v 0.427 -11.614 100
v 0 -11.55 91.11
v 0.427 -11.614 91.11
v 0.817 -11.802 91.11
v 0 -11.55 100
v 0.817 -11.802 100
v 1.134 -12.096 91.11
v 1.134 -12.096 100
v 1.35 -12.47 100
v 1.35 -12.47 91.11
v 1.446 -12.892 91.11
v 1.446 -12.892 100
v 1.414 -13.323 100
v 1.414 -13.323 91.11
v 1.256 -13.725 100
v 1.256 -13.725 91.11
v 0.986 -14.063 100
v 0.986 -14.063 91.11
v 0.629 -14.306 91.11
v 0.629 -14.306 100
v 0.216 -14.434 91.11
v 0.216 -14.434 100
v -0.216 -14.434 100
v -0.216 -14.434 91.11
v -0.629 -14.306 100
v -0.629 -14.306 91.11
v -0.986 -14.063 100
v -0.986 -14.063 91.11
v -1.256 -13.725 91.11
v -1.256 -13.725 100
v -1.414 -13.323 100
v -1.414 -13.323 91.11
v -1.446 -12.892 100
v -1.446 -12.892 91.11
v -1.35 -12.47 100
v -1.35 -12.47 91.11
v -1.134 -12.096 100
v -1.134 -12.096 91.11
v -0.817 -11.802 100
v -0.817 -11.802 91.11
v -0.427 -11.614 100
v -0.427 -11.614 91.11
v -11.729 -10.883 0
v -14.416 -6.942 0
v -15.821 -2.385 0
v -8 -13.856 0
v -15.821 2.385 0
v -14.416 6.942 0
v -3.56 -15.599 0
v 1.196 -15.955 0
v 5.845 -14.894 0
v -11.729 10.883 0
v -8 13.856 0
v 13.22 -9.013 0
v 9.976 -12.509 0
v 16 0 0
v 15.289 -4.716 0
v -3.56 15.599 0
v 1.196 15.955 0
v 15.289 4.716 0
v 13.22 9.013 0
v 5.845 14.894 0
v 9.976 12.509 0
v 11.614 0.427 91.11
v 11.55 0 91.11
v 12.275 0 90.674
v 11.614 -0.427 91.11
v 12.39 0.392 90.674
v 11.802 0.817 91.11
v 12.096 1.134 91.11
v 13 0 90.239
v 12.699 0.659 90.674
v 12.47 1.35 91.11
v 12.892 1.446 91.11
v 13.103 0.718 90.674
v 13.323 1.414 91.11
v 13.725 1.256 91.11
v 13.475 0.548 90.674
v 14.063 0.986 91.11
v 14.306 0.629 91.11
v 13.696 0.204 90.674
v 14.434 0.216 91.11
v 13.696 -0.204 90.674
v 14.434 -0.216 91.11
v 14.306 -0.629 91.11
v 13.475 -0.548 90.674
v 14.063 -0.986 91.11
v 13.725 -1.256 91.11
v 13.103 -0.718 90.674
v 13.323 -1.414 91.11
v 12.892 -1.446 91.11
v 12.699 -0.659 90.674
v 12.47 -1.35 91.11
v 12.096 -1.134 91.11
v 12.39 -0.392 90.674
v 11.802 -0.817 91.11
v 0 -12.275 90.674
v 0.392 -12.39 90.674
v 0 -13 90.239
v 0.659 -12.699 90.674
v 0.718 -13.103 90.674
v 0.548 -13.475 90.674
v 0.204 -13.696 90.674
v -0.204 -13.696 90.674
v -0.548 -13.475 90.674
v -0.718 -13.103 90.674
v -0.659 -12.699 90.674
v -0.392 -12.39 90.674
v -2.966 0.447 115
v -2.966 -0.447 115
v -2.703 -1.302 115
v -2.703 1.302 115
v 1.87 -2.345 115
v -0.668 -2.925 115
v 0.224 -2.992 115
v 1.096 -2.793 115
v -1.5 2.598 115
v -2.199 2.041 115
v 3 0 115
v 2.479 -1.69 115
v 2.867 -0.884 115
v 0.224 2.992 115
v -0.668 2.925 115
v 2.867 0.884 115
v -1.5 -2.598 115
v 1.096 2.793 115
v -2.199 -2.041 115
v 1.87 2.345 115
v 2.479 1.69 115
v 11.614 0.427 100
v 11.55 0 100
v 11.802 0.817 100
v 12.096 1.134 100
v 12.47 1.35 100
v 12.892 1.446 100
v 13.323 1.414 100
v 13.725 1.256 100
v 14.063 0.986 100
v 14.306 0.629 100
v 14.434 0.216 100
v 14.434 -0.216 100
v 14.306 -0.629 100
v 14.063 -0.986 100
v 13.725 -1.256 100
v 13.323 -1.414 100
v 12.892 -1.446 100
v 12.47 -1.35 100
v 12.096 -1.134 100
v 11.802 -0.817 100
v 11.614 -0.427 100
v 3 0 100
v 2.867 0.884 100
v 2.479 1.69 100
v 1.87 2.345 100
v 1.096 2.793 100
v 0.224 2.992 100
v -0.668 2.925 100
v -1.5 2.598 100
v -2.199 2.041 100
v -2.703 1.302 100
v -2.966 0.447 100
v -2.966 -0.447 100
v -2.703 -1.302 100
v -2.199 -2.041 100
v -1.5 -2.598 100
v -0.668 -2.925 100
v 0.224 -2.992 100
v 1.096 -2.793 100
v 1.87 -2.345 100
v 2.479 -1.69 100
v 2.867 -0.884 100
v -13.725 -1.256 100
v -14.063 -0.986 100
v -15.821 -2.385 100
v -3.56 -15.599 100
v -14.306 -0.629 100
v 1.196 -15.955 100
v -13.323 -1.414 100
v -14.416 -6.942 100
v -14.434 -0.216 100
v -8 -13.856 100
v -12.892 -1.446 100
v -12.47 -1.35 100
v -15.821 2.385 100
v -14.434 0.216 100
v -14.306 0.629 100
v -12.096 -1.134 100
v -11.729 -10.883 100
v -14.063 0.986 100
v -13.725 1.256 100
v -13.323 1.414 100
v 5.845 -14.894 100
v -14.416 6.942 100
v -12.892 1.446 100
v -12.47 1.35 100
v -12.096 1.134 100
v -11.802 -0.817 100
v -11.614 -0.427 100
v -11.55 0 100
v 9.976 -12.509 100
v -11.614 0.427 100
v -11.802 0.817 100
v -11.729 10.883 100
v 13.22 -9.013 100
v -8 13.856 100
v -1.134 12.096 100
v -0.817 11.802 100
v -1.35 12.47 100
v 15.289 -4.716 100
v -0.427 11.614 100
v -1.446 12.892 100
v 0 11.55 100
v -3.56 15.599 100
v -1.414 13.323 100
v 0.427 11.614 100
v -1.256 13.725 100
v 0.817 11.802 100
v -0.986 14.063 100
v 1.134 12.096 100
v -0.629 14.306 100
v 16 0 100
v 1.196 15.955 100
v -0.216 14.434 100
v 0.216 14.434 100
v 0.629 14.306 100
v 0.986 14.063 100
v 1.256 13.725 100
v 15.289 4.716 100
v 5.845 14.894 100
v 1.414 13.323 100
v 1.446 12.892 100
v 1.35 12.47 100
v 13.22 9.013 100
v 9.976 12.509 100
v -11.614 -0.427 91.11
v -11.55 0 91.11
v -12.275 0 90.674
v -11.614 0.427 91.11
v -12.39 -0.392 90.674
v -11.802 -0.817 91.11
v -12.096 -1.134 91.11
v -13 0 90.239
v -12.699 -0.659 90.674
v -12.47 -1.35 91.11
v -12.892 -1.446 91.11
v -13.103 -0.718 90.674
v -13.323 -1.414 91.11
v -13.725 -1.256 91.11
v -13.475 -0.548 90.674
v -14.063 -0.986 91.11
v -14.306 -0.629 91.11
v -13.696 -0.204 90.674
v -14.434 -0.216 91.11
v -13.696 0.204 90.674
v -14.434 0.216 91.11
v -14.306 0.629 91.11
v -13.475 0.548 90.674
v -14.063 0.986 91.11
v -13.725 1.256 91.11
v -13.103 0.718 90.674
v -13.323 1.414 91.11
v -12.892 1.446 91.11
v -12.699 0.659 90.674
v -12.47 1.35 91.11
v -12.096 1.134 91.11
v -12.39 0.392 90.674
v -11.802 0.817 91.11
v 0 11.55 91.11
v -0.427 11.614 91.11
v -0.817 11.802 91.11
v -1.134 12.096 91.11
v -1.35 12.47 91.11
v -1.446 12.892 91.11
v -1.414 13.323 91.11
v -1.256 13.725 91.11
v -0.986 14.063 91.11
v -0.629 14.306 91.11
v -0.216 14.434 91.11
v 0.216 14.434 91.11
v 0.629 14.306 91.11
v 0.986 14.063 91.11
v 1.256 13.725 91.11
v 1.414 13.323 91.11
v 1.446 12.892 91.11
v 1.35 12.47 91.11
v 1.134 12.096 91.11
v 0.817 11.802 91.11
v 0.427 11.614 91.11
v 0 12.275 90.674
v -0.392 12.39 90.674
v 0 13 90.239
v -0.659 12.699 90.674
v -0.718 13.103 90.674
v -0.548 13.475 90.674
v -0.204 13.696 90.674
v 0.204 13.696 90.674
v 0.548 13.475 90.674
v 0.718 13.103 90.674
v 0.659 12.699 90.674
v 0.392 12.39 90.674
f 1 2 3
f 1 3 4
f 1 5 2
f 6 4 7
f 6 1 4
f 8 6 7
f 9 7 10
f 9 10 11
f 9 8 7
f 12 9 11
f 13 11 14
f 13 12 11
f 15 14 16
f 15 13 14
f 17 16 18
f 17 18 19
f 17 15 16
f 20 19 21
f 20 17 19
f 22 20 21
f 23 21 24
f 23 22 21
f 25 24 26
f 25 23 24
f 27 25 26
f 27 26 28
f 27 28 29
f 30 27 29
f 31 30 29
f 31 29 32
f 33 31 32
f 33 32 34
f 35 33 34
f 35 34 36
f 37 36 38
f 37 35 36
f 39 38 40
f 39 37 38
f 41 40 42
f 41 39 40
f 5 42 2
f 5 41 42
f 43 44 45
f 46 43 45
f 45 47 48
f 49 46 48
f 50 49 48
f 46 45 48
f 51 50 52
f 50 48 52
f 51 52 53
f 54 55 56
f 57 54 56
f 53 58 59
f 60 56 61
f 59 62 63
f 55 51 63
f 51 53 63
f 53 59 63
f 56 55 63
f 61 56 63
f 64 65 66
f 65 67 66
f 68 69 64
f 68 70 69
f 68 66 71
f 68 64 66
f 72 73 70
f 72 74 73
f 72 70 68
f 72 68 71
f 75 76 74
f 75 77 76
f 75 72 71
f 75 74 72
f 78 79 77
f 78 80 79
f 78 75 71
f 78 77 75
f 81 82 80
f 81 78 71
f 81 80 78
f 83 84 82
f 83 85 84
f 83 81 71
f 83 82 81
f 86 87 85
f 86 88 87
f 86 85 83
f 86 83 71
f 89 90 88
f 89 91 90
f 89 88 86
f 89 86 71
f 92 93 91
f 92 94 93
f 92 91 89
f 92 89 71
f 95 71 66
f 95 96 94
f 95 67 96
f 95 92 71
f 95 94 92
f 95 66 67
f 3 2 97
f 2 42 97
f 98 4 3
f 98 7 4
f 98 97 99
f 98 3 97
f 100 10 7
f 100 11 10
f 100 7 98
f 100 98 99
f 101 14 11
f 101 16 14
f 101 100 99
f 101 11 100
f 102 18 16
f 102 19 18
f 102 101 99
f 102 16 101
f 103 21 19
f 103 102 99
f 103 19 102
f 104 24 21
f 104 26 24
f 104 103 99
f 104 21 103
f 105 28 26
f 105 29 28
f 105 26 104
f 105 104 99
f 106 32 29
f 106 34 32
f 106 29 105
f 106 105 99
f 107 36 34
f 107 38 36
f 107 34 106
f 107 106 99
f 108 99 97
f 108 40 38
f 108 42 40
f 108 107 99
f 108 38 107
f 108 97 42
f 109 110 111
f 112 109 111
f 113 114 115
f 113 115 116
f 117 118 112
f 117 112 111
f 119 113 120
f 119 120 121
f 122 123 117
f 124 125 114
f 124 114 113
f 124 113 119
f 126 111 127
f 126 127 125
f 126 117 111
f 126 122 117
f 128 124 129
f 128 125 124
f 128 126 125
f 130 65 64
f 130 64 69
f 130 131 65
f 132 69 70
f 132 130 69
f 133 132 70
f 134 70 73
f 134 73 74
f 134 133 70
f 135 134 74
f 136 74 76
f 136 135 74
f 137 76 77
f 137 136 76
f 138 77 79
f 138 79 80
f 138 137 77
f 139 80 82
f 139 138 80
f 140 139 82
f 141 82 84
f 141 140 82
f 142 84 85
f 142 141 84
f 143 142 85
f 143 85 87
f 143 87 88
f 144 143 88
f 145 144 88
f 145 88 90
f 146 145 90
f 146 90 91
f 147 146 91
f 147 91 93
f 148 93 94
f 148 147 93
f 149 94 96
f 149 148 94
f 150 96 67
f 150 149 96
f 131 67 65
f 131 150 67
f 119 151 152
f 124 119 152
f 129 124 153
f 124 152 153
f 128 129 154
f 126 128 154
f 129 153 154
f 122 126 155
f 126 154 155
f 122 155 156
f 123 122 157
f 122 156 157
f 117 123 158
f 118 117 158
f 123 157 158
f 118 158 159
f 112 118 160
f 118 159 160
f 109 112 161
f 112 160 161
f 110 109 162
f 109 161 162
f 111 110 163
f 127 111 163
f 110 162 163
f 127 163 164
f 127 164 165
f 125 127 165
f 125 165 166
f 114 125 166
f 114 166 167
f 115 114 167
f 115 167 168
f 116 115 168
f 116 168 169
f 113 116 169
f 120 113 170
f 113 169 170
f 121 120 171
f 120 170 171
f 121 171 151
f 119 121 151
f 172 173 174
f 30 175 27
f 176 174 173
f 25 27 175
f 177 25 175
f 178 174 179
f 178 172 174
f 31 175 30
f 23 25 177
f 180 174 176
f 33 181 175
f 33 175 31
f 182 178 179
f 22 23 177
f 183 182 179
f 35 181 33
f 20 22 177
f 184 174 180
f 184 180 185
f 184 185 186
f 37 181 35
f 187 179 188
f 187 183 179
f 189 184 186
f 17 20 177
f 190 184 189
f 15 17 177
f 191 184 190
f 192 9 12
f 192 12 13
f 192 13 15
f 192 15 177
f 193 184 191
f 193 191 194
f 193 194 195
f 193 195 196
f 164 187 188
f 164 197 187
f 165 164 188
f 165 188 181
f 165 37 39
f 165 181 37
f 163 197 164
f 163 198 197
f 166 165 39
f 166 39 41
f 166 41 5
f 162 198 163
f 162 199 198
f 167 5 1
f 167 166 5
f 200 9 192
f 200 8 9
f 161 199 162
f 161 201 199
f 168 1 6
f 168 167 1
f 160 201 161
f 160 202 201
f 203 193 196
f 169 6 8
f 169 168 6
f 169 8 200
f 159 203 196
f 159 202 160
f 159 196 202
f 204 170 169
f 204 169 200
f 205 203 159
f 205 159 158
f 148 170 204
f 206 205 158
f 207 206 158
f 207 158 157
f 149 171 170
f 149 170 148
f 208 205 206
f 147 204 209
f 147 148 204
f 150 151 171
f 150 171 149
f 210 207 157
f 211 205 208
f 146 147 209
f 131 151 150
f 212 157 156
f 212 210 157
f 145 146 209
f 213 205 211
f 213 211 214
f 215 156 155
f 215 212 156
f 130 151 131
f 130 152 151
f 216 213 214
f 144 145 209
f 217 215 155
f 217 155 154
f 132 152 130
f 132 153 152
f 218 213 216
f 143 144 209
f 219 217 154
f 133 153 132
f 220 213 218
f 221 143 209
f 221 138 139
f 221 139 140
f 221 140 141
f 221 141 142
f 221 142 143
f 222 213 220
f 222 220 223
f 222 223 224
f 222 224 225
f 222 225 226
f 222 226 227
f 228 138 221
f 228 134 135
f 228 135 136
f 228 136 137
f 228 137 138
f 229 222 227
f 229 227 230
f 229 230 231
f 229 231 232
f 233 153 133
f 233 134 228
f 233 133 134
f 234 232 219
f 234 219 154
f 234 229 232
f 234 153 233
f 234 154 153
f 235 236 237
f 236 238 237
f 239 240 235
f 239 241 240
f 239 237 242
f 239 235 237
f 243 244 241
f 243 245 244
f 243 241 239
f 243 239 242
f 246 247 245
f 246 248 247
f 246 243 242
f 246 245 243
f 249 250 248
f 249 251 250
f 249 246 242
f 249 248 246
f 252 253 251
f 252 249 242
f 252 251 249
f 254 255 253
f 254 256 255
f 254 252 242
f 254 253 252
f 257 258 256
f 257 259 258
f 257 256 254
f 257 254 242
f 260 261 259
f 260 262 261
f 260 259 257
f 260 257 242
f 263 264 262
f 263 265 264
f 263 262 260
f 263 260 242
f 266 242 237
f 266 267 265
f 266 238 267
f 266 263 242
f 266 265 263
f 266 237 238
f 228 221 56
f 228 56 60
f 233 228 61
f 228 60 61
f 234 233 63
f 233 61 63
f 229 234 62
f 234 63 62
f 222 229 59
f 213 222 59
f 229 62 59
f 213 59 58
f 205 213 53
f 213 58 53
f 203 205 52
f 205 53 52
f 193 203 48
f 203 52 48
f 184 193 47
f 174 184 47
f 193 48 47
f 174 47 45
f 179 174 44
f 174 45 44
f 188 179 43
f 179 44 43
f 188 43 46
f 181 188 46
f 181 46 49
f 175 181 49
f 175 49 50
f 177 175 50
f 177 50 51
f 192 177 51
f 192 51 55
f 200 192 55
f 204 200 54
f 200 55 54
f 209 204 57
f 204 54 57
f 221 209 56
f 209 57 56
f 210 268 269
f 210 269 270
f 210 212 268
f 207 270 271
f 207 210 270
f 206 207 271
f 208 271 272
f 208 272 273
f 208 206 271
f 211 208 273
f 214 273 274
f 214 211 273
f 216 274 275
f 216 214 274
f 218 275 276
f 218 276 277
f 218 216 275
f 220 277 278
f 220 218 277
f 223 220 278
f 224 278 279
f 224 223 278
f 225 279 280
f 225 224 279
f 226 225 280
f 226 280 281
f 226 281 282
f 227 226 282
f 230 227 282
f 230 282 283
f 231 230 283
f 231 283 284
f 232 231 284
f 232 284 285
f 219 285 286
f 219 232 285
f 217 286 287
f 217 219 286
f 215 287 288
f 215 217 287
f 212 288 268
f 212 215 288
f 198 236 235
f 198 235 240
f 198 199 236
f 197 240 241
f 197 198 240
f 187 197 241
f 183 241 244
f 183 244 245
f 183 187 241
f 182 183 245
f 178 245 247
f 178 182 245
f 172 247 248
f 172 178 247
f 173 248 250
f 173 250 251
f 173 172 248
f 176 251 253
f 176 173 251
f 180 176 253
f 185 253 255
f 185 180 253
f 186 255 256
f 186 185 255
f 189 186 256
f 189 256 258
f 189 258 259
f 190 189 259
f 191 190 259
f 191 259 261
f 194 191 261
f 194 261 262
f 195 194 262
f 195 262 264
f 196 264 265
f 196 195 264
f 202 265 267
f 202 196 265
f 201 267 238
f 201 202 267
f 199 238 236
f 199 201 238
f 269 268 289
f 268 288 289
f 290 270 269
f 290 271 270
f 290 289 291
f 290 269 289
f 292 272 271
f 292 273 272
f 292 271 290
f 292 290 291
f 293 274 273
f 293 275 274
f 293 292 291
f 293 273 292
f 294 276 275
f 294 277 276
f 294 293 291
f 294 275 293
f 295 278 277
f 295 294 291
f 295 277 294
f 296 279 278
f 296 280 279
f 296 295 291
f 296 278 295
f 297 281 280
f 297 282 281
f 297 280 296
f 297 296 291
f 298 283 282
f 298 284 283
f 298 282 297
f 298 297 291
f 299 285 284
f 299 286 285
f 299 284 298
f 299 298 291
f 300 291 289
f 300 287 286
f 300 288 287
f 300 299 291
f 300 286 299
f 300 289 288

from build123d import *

# Parameters (mm, degrees)
SKETCH1_R           = 16
BOSS_EXTRUDE1_DEPTH = 100
SKETCH2_R           = 3
BOSS_EXTRUDE2_DEPTH = 15
CIRPATTERN1_COUNT   = 4


with BuildPart() as part:
    # Sketch1 → Boss-Extrude1 (new body)
    with BuildSketch(Plane.XY):
        Circle(SKETCH1_R)
    extrude(amount=BOSS_EXTRUDE1_DEPTH)

    # Sketch2 → Boss-Extrude2 (add)
    with BuildSketch(Plane.XY.offset(100)):
        Circle(SKETCH2_R)
    extrude(amount=BOSS_EXTRUDE2_DEPTH)

    # Sketch6 → M3.5x0.6 Tapped Hole1 (revolve, cut)
    with BuildSketch(Plane(origin=(0, 13, 100), x_dir=(0, -1, 0), z_dir=(1, 0, 0))):
        Polygon((0, 0), (0, 9.761247898), (1.45, 8.89), (1.45, 0), align=None)
    m3_5x0_6_tapped_hole1 = revolve(axis=Axis((0, 13, 106.35), (0, 0, -1)), mode=Mode.SUBTRACT)

    # CirPattern1: M3.5x0.6 Tapped Hole1 ×4 about axis
    cirpattern1_axis = Axis((0, 0, 0), (0, 0, 1))
    for i in range(1, CIRPATTERN1_COUNT):
        add(m3_5x0_6_tapped_hole1.rotate(cirpattern1_axis, i * 360 / CIRPATTERN1_COUNT), mode=Mode.SUBTRACT)


solid = part.part
